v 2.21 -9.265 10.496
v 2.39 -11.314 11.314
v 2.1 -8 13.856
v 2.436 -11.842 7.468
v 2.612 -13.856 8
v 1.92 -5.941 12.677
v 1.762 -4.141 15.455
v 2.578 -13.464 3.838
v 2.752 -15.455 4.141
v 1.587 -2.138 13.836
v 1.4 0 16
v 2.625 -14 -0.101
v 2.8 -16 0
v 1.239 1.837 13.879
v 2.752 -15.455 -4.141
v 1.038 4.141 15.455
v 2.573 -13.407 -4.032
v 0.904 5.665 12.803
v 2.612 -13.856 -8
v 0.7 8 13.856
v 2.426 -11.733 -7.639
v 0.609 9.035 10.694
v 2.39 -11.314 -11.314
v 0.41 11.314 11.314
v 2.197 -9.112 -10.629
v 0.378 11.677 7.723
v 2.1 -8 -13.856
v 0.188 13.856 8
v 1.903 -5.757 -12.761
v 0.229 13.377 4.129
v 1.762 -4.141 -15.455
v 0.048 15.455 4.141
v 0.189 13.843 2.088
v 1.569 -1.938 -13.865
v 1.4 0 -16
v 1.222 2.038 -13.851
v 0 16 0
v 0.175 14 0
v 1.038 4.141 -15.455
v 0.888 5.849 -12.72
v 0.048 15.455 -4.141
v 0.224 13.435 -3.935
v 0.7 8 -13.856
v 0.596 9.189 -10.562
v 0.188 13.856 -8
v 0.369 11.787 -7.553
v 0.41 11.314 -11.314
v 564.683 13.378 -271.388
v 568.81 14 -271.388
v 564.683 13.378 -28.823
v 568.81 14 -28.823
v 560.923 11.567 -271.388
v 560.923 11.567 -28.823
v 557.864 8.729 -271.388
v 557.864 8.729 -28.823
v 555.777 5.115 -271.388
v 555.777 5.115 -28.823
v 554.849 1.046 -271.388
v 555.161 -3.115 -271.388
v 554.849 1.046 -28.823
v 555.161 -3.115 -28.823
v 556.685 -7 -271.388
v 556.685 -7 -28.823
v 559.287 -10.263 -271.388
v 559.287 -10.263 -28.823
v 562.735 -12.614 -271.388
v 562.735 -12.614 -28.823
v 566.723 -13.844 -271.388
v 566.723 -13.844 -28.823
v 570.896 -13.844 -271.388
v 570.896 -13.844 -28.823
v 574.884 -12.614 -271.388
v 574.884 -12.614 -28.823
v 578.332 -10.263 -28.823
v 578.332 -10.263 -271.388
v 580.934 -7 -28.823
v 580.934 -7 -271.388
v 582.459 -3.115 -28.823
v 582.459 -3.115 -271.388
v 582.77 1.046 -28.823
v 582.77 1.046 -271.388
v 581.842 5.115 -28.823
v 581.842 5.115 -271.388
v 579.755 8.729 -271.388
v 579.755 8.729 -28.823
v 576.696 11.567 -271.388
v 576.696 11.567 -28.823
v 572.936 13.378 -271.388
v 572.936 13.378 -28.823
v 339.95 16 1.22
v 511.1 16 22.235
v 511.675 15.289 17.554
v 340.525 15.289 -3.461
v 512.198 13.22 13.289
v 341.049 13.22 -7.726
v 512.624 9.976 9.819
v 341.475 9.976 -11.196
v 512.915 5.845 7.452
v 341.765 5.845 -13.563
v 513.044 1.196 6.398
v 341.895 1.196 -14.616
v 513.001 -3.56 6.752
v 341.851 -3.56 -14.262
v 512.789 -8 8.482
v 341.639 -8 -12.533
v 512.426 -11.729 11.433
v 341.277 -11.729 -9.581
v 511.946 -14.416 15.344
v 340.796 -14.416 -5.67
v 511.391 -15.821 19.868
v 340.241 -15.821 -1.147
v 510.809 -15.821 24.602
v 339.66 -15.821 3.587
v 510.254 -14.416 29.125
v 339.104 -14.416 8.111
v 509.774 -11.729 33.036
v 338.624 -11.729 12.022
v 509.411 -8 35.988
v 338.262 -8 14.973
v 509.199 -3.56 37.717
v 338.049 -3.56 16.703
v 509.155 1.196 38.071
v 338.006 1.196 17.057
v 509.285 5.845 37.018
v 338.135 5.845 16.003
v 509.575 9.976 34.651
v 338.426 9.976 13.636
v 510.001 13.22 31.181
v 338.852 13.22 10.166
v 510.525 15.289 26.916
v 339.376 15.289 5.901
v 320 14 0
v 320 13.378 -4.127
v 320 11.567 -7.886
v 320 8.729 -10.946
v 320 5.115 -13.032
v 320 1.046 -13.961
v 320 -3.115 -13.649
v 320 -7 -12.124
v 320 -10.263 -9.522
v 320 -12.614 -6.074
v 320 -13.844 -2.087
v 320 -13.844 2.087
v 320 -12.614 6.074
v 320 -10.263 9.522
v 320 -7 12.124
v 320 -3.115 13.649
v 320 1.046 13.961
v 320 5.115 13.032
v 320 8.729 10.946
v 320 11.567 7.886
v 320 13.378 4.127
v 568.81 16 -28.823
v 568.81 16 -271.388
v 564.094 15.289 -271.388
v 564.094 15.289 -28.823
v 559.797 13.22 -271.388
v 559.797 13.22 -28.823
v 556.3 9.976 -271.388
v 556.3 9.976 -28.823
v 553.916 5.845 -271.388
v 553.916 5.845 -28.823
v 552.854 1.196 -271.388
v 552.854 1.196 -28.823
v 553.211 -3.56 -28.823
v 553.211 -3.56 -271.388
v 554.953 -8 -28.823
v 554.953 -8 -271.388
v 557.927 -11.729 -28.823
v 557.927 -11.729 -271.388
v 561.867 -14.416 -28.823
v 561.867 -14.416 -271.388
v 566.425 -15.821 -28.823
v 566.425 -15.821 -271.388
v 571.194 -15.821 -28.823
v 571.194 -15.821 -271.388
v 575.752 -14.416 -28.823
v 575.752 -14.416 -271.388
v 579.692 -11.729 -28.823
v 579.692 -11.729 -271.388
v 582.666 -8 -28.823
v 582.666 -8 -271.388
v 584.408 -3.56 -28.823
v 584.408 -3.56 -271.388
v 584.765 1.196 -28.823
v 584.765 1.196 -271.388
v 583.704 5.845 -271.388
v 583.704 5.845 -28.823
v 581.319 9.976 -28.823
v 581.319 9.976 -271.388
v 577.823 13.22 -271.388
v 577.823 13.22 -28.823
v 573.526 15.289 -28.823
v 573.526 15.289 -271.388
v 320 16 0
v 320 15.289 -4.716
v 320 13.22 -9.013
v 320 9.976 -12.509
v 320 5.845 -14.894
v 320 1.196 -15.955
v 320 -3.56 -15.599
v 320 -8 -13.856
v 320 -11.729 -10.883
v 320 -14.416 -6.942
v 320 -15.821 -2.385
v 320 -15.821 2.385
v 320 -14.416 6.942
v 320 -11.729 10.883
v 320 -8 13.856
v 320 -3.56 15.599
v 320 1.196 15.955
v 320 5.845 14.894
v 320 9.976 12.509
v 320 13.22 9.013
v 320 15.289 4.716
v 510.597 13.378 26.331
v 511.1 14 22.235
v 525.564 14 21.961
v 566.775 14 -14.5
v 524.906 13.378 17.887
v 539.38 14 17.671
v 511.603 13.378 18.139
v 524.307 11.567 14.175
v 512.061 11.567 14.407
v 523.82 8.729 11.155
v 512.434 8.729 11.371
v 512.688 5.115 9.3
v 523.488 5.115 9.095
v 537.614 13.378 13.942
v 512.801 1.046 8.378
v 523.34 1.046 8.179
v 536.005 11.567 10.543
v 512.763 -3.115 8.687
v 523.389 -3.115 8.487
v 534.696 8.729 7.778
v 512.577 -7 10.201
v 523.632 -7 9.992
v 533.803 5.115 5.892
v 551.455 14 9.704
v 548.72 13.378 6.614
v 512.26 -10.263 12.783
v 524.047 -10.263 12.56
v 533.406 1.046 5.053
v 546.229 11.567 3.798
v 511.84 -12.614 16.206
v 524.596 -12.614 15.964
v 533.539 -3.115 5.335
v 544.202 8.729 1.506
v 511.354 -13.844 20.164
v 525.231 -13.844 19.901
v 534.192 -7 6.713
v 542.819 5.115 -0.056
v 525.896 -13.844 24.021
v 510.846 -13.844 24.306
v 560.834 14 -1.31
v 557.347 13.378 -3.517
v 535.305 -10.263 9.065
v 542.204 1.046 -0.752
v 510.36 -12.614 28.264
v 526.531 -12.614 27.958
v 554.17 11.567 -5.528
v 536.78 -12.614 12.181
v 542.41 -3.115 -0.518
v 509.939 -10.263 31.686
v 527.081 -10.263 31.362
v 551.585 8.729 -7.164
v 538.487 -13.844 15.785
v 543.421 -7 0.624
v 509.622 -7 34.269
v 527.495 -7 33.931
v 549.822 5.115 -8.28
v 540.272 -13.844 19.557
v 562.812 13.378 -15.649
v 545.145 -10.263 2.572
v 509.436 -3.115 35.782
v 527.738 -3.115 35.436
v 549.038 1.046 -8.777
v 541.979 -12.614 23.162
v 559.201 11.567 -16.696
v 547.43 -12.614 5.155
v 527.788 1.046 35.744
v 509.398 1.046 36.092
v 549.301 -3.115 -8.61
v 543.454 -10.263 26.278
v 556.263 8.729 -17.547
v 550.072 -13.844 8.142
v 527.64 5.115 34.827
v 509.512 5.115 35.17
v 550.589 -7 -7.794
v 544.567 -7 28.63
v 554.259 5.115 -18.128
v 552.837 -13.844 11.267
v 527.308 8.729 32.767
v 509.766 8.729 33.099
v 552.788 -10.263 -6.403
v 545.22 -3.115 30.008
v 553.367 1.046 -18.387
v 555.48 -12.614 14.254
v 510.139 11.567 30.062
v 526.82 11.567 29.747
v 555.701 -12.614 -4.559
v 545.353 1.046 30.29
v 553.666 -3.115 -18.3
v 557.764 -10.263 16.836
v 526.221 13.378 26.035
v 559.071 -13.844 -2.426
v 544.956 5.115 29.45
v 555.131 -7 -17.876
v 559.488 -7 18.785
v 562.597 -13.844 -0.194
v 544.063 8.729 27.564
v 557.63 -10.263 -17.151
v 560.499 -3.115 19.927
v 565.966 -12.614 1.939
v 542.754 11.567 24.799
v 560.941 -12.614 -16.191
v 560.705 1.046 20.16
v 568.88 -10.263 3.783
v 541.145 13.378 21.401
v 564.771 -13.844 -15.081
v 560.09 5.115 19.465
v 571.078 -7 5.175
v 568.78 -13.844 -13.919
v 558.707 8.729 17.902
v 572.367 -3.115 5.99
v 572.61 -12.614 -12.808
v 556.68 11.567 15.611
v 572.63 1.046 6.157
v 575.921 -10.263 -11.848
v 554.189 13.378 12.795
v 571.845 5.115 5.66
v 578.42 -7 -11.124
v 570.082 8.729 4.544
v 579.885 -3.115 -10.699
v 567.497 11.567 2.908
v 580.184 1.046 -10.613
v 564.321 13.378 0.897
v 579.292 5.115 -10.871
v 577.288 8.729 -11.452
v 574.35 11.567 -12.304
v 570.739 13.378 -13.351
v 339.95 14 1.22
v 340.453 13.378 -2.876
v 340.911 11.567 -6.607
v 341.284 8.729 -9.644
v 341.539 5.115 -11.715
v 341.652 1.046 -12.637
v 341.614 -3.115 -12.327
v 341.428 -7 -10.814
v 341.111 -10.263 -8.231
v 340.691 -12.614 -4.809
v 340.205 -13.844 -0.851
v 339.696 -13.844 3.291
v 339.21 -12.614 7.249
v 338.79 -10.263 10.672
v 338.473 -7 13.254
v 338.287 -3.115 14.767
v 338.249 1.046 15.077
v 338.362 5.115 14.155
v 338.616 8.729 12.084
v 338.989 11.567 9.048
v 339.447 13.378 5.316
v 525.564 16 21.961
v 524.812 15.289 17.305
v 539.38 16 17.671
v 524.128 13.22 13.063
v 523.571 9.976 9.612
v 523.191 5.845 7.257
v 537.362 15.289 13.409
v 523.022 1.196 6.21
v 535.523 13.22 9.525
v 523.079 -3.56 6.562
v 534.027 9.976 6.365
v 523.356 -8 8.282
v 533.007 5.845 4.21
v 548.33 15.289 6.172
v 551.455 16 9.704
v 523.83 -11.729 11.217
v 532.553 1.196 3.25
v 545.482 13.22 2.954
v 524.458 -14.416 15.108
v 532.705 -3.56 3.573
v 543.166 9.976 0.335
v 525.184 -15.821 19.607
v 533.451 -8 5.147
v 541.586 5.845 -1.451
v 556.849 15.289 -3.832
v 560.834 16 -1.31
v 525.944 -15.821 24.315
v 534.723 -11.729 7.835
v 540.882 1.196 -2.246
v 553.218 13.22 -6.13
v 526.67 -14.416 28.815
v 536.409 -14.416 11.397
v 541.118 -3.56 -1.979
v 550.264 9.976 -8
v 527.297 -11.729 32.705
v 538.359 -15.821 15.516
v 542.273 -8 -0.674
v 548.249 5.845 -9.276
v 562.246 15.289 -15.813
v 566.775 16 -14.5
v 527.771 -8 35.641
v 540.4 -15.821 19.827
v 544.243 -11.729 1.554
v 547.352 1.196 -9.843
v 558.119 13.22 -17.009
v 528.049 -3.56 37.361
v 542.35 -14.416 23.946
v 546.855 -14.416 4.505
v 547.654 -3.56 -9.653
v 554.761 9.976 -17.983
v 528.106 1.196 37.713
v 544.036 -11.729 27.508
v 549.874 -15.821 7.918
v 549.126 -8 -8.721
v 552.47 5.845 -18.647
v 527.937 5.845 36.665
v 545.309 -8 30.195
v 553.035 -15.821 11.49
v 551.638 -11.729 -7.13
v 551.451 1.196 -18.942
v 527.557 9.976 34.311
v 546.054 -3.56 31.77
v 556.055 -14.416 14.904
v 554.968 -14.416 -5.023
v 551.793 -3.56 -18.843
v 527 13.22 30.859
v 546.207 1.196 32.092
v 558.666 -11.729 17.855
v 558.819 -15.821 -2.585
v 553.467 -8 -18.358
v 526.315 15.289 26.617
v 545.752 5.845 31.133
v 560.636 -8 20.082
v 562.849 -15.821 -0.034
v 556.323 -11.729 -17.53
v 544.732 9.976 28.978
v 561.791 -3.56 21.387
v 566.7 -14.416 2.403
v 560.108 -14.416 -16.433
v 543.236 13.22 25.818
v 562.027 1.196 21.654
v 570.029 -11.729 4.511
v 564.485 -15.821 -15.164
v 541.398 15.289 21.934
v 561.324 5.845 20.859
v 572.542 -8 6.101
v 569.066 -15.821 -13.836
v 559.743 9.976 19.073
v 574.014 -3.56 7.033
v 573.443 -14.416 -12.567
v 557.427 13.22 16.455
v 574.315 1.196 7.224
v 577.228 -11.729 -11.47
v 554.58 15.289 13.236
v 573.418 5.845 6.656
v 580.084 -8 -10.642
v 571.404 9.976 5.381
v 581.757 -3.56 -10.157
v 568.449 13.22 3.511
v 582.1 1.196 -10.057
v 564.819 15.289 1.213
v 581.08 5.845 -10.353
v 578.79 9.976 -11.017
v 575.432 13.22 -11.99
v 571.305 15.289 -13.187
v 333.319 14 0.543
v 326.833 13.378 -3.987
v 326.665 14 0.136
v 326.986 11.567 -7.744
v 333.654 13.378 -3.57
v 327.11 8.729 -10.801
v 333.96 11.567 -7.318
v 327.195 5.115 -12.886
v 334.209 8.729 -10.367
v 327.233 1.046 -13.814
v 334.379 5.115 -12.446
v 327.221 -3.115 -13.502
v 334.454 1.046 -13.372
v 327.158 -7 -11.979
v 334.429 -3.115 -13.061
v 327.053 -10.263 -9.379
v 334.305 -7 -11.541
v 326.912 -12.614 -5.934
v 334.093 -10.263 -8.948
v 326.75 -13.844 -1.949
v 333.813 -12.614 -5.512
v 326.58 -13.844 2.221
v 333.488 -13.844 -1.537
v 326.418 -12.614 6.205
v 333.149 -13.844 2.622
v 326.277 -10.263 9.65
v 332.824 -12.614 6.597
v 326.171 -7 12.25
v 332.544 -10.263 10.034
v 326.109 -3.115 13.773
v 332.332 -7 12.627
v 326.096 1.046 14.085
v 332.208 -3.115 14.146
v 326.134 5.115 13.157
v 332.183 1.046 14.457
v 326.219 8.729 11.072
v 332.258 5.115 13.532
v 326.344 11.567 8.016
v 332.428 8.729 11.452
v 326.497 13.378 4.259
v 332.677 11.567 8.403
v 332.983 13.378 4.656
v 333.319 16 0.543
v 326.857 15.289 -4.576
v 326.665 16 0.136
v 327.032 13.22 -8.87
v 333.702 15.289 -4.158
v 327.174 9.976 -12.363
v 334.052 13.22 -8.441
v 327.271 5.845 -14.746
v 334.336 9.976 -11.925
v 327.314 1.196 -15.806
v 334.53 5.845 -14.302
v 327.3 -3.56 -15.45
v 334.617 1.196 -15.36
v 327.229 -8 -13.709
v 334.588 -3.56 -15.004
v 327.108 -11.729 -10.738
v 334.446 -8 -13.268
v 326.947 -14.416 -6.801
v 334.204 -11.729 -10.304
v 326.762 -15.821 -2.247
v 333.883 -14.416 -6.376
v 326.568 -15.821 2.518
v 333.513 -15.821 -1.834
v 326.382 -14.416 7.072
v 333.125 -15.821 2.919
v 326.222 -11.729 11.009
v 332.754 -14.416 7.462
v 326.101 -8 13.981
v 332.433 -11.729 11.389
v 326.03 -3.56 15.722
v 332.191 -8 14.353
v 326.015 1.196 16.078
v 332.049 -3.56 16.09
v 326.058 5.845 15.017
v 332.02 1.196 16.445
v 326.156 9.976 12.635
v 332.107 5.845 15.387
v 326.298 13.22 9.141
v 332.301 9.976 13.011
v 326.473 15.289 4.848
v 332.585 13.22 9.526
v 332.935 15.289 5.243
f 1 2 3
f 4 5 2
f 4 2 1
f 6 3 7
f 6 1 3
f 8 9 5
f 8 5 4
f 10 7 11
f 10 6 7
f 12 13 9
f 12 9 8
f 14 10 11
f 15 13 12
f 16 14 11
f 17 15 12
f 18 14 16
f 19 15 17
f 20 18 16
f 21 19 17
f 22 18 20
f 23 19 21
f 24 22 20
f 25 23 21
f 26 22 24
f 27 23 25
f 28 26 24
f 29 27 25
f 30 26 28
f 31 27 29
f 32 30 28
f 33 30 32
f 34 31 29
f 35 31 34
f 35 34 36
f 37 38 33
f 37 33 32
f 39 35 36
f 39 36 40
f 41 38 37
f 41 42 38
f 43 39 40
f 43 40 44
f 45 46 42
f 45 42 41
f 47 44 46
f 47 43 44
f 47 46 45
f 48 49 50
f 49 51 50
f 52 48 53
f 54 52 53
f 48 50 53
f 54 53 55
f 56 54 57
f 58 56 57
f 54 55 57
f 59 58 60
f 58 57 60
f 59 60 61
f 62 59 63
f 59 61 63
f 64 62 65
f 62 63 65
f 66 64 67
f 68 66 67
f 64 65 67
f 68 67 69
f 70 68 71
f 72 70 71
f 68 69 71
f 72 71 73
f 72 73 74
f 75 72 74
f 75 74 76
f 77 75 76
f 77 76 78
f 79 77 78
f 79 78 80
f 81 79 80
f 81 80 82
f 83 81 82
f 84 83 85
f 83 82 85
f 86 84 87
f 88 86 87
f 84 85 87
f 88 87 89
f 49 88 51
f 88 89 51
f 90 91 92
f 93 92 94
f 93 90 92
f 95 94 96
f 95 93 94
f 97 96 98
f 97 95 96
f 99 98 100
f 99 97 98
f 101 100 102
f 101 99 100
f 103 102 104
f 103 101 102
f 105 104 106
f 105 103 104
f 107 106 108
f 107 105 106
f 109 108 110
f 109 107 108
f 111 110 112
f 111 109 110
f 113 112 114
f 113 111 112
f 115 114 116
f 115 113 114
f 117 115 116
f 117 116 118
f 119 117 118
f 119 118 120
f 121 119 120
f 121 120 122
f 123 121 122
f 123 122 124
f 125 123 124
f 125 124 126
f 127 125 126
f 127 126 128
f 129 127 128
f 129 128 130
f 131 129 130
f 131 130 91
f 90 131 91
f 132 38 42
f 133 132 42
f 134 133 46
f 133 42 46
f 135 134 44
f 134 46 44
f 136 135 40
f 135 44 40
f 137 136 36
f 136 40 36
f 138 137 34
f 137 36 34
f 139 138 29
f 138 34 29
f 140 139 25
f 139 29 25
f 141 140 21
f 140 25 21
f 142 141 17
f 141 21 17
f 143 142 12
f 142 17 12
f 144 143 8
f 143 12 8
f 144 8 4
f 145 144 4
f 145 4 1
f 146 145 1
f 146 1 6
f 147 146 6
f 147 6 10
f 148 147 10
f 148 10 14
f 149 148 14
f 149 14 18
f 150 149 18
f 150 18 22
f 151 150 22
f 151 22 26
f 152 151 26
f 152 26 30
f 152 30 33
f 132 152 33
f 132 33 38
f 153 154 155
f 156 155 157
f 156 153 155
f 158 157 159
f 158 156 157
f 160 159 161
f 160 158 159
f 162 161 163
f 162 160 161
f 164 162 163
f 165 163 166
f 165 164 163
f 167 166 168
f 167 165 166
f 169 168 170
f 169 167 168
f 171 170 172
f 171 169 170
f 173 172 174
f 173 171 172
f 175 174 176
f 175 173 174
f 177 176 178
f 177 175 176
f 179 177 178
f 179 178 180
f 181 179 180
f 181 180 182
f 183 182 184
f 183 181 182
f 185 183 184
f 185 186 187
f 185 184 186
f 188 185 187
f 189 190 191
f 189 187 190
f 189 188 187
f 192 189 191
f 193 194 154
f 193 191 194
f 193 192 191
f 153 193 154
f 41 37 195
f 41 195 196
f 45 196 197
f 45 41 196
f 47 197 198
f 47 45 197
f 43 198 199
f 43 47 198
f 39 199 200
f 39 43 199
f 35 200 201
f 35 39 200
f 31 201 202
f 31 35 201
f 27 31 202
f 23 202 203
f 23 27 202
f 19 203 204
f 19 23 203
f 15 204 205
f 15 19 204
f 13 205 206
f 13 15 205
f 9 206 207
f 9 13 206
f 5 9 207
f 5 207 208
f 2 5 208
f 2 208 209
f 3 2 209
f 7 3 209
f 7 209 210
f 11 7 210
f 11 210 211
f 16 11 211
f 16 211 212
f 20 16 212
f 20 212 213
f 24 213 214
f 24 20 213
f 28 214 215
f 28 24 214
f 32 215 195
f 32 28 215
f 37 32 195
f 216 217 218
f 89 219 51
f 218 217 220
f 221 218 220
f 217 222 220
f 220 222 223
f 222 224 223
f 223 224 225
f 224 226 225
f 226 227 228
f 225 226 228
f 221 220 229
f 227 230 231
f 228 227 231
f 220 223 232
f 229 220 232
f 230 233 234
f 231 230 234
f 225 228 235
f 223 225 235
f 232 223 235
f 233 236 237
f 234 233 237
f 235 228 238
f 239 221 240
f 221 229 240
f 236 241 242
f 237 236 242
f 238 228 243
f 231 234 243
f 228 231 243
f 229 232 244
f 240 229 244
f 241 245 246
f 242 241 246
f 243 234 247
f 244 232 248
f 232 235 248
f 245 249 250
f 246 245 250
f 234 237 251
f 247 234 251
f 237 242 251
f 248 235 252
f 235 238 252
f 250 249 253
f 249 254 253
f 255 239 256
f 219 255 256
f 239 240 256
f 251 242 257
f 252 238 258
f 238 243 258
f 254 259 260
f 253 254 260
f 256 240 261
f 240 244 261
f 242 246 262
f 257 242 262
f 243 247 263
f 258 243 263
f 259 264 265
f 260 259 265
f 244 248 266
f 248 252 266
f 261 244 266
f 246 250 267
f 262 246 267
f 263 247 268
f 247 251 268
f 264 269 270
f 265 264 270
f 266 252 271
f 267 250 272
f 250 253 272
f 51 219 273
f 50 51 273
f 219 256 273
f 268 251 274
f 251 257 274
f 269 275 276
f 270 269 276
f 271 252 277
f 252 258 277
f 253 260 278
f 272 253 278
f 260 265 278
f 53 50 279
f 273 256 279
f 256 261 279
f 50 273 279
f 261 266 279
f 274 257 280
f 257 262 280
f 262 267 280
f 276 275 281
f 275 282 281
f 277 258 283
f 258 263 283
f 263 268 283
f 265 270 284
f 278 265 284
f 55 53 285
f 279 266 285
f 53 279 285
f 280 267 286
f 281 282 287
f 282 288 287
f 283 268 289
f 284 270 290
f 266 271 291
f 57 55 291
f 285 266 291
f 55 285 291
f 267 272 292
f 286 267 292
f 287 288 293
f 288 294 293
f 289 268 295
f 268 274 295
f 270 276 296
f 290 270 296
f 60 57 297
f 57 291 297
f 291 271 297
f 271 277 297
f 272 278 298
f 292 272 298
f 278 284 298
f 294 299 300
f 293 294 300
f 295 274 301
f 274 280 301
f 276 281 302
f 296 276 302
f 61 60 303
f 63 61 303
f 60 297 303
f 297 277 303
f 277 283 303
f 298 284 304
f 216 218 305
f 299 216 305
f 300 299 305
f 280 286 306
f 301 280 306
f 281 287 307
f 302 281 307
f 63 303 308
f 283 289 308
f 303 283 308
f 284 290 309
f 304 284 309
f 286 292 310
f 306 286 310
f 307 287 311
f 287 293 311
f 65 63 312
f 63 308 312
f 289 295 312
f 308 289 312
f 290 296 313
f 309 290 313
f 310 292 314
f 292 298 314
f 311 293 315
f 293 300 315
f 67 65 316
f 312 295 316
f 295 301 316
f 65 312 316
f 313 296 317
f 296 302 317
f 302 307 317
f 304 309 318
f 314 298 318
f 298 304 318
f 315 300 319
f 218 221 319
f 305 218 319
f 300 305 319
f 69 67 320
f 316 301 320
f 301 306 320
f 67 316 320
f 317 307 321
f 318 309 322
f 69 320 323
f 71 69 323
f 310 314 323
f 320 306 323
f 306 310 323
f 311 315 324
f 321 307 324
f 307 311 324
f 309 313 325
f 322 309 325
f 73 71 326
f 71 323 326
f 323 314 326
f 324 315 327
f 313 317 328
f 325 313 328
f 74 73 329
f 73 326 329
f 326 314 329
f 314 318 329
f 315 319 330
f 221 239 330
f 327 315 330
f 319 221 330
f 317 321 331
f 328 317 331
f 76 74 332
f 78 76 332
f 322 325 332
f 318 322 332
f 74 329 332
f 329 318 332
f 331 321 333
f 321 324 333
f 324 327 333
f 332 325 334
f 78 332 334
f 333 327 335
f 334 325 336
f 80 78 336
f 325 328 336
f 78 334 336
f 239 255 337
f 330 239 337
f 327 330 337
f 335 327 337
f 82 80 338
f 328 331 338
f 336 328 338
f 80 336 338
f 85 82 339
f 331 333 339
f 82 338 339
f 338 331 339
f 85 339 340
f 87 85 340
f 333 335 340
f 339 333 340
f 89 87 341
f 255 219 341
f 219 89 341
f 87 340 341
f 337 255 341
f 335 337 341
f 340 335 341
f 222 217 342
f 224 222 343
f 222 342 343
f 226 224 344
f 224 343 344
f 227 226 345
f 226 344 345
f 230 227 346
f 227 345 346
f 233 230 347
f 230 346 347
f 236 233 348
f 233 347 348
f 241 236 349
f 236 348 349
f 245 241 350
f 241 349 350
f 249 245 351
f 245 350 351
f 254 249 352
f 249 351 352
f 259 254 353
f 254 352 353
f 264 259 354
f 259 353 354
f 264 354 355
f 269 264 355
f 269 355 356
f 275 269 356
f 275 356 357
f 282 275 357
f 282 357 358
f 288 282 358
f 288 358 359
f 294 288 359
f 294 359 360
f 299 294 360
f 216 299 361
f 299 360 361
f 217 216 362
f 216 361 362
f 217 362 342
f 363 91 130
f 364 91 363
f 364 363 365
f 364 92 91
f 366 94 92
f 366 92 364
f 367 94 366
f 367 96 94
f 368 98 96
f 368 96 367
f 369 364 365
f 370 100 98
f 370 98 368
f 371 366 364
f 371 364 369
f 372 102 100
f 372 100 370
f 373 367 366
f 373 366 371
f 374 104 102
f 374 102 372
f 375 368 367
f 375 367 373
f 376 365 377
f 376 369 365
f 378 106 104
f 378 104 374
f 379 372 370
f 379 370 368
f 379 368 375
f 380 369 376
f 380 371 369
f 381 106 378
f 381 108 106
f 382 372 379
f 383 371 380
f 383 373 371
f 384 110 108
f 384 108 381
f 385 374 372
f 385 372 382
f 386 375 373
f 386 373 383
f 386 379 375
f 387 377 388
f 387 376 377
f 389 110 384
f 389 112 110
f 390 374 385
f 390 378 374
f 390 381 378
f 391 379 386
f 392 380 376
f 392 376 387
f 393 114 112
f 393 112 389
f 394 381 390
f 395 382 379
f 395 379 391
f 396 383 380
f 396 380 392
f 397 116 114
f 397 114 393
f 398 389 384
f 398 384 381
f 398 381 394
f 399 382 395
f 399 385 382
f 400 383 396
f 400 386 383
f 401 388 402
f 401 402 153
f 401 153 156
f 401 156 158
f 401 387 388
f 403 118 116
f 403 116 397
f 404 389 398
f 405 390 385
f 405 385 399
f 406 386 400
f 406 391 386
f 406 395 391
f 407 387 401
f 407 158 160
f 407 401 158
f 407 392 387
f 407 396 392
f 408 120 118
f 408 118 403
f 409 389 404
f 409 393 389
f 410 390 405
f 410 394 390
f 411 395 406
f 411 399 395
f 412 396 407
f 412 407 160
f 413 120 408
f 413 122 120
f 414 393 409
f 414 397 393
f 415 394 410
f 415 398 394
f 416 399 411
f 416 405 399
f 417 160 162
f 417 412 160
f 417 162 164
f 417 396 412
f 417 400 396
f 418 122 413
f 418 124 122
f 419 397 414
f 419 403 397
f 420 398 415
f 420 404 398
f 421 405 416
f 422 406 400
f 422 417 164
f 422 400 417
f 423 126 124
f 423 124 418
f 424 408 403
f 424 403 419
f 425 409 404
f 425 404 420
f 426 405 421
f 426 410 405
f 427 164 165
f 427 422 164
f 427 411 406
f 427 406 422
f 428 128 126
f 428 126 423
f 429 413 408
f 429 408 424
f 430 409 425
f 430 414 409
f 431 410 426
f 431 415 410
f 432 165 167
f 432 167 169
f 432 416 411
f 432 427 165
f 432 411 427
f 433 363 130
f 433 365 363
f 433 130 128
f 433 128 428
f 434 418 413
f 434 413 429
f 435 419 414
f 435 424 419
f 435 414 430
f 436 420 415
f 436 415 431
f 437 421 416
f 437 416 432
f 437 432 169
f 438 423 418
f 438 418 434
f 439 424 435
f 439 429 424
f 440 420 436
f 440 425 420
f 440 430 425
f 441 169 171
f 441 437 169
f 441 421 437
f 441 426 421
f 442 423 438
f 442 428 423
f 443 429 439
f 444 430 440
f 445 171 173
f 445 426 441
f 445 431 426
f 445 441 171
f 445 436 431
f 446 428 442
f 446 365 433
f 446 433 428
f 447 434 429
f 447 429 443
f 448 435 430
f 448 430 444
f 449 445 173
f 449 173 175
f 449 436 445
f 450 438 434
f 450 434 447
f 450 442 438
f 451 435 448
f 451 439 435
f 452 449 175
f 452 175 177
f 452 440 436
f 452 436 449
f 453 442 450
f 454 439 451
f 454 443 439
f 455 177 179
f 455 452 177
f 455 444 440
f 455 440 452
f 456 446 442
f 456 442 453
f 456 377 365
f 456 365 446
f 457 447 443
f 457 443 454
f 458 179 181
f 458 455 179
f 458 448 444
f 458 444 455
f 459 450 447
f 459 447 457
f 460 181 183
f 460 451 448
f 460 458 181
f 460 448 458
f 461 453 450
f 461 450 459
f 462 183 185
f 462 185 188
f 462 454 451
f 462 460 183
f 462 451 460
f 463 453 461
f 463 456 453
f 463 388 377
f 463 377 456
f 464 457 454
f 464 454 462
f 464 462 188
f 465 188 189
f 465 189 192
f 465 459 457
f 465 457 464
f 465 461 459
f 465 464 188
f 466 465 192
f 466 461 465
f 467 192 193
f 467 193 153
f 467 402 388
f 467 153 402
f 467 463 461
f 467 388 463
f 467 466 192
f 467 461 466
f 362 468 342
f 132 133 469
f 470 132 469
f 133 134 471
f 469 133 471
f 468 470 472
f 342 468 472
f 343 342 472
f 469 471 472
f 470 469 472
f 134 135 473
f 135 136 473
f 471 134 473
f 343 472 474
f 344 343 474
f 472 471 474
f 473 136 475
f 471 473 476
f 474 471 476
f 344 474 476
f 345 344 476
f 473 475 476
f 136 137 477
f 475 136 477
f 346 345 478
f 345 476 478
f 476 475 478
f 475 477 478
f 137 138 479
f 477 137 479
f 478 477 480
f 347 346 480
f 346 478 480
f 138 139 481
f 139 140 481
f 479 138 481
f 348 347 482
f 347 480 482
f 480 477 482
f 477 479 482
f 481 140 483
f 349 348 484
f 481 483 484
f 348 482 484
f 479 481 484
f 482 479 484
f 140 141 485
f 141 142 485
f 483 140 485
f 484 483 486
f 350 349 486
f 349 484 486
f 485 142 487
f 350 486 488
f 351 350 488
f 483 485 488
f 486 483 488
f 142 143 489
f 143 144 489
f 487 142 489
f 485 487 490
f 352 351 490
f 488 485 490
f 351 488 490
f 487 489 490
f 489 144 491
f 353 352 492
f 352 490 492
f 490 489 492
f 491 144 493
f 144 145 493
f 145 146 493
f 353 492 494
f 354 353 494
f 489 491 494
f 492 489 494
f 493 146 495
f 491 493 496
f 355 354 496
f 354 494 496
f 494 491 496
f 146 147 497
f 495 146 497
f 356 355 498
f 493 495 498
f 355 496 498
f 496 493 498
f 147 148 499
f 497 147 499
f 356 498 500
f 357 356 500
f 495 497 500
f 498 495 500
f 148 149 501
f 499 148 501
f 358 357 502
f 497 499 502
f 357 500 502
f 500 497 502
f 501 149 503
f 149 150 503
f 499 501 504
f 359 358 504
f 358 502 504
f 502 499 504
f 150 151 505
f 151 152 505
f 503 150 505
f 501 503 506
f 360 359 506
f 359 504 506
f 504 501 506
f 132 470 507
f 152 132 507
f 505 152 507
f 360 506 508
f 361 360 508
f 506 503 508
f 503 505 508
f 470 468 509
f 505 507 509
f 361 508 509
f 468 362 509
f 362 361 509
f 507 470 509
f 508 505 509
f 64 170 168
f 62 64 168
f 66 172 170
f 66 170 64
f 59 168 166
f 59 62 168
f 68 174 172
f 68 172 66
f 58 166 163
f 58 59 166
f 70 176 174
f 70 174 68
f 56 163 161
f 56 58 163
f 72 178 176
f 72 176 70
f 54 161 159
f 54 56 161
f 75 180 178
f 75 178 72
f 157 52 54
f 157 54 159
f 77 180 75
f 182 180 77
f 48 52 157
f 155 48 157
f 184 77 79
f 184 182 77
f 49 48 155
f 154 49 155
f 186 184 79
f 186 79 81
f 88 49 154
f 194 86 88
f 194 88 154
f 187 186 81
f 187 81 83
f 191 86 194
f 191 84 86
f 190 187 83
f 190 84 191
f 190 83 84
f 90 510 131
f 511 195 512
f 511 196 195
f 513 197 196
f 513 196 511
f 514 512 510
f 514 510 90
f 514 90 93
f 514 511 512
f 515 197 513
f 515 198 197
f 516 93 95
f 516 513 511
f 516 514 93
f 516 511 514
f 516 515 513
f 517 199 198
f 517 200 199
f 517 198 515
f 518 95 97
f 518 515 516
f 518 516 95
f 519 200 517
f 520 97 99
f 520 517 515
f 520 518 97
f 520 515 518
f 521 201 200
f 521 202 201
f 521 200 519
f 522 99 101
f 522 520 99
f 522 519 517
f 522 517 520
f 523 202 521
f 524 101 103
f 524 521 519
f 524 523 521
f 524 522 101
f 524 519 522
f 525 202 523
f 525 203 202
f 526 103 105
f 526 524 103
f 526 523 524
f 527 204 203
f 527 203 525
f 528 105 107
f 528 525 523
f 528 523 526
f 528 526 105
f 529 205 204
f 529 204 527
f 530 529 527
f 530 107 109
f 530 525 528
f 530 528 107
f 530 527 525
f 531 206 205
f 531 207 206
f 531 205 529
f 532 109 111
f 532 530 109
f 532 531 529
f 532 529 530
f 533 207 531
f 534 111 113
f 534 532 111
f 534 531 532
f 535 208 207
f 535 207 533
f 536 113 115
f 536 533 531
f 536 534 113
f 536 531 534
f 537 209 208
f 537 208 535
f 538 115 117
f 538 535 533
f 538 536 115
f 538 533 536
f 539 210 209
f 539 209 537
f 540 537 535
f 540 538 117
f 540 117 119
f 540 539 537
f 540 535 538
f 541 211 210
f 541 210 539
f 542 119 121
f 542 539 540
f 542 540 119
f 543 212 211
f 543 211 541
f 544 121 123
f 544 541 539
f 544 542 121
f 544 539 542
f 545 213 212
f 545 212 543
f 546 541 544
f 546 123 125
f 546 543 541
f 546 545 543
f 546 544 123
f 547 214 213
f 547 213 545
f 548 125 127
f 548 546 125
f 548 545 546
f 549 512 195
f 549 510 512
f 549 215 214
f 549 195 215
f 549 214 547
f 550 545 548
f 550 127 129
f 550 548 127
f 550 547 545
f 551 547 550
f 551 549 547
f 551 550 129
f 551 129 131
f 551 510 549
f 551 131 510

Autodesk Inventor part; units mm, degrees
ref_plane "YZ Plane" through (0, 0, 0) normal (1, 0, 0) x (0, 1, 0)
ref_plane "XZ Plane" through (0, 0, 0) normal (0, 1, 0) x (-1, 0, 0)
sketch "Szkic1" plane through (0, 0, 0) normal (1, 0, 0) x (0, 1, 0)
  circle A0 centre (0, 0) radius 16
  dimension "d0" = 32
extrude "Wyciągnięcie proste1" add sketch "Szkic1" along normal blind 815
shell "Skorupa1" thickness 2 removed faces 2 at (815, 4.7224, 2.4785) at (0, 4.7224, 2.4785)
sketch "Szkic4" plane through (0, 0, 0) normal (0, 0, 1) x (1, 0, 0)
  line L0 (320, 29.1092) -> (320, -35.5658)
  line L1 (0, 16) -> (0, -16) projected
  point P0 (0, 0)
  dimension "d8" = 320
bend part "Gięcie części1" radius 163.7022 angle 7 line through (320, 29.1092, 0) along (0, -1, 0) centre toward (0, 0, 1) moving side (1, 0, 0) both sides no
sketch "Szkic7" plane through (811.4097, 0, 59.1081) normal (0.9925462, 0, 0.1218693) x (0.1218693, 0, -0.9925462)
  circle A0 centre (0, 0) radius 14 projected
  circle A1 centre (0, 0) radius 16 projected
  point P0 (-40.2184, 0)
  point P1 (16, 0)
ref_plane "Płaszczyzna konstrukcyjna4" through (813.3596, 0, 43.2274) normal (0.1218693, 0, -0.9925462) x (0, 1, 0)
sketch "Szkic8" plane through (813.3596, 0, 43.2274) normal (0.1218693, 0, -0.9925462) x (0, 1, 0)
  line L0 (-19.5179, -302.5651) -> (38.9, -302.5651)
  ellipse E0 centre (0, -812.5651) end of major axis (-16, -812.5651) minor radius 1.9499 projected
  dimension "d15" = 510
bend part "Gięcie części2" radius 35.4407 angle 97 line through (513.0498, -19.5179, 6.354) along (0, 1, 0) centre toward (0.1218693, 0, -0.9925462) moving side (0.9925462, 0, 0.1218693) both sides no
sketch "Szkic10" plane through (0, 0, 0) normal (0, 0, 1) x (1, 0, 0)
  line L0 (0, 16) -> (0, -16) construction
  line L1 (0, -16) -> (320, -16) construction
  line L2 (0, 16) -> (0, -16)
  line L3 (0, -16) -> (2.7996, -16)
  line L4 (2.7996, -16) -> (0, 16)
  point P0 (0, 0)
  dimension "d22" = 5
extrude "Wyciągnięcie proste4" cut sketch "Szkic10" along normal mid plane 32
equation "\"PromieńGięcia\" = Grubość"
equation "\"SzerokośćGięciaPodcięcia\" = Grubość"
equation "\"GłębokośćGięciaPodcięcia\" = 0.5 * Grubość"
equation "\"RozmiarPodcięciaNarożnika\" = 4 * Grubość"
equation "\"MinimalnaPozostałość\" = 2 * Grubość"
equation "\"PromieńPrzejścia\" = PromieńGięcia"
equation "\"Rozmiar_promienia_Jacobiego\" = Grubość"
equation "\"Wielk_odstępu\" = Grubość"
equation "\"Grubość\" = 0.5"
properties part number "Rura_podłużna_ergosiedziska_lewa" material "Aluminium AW-7020"
